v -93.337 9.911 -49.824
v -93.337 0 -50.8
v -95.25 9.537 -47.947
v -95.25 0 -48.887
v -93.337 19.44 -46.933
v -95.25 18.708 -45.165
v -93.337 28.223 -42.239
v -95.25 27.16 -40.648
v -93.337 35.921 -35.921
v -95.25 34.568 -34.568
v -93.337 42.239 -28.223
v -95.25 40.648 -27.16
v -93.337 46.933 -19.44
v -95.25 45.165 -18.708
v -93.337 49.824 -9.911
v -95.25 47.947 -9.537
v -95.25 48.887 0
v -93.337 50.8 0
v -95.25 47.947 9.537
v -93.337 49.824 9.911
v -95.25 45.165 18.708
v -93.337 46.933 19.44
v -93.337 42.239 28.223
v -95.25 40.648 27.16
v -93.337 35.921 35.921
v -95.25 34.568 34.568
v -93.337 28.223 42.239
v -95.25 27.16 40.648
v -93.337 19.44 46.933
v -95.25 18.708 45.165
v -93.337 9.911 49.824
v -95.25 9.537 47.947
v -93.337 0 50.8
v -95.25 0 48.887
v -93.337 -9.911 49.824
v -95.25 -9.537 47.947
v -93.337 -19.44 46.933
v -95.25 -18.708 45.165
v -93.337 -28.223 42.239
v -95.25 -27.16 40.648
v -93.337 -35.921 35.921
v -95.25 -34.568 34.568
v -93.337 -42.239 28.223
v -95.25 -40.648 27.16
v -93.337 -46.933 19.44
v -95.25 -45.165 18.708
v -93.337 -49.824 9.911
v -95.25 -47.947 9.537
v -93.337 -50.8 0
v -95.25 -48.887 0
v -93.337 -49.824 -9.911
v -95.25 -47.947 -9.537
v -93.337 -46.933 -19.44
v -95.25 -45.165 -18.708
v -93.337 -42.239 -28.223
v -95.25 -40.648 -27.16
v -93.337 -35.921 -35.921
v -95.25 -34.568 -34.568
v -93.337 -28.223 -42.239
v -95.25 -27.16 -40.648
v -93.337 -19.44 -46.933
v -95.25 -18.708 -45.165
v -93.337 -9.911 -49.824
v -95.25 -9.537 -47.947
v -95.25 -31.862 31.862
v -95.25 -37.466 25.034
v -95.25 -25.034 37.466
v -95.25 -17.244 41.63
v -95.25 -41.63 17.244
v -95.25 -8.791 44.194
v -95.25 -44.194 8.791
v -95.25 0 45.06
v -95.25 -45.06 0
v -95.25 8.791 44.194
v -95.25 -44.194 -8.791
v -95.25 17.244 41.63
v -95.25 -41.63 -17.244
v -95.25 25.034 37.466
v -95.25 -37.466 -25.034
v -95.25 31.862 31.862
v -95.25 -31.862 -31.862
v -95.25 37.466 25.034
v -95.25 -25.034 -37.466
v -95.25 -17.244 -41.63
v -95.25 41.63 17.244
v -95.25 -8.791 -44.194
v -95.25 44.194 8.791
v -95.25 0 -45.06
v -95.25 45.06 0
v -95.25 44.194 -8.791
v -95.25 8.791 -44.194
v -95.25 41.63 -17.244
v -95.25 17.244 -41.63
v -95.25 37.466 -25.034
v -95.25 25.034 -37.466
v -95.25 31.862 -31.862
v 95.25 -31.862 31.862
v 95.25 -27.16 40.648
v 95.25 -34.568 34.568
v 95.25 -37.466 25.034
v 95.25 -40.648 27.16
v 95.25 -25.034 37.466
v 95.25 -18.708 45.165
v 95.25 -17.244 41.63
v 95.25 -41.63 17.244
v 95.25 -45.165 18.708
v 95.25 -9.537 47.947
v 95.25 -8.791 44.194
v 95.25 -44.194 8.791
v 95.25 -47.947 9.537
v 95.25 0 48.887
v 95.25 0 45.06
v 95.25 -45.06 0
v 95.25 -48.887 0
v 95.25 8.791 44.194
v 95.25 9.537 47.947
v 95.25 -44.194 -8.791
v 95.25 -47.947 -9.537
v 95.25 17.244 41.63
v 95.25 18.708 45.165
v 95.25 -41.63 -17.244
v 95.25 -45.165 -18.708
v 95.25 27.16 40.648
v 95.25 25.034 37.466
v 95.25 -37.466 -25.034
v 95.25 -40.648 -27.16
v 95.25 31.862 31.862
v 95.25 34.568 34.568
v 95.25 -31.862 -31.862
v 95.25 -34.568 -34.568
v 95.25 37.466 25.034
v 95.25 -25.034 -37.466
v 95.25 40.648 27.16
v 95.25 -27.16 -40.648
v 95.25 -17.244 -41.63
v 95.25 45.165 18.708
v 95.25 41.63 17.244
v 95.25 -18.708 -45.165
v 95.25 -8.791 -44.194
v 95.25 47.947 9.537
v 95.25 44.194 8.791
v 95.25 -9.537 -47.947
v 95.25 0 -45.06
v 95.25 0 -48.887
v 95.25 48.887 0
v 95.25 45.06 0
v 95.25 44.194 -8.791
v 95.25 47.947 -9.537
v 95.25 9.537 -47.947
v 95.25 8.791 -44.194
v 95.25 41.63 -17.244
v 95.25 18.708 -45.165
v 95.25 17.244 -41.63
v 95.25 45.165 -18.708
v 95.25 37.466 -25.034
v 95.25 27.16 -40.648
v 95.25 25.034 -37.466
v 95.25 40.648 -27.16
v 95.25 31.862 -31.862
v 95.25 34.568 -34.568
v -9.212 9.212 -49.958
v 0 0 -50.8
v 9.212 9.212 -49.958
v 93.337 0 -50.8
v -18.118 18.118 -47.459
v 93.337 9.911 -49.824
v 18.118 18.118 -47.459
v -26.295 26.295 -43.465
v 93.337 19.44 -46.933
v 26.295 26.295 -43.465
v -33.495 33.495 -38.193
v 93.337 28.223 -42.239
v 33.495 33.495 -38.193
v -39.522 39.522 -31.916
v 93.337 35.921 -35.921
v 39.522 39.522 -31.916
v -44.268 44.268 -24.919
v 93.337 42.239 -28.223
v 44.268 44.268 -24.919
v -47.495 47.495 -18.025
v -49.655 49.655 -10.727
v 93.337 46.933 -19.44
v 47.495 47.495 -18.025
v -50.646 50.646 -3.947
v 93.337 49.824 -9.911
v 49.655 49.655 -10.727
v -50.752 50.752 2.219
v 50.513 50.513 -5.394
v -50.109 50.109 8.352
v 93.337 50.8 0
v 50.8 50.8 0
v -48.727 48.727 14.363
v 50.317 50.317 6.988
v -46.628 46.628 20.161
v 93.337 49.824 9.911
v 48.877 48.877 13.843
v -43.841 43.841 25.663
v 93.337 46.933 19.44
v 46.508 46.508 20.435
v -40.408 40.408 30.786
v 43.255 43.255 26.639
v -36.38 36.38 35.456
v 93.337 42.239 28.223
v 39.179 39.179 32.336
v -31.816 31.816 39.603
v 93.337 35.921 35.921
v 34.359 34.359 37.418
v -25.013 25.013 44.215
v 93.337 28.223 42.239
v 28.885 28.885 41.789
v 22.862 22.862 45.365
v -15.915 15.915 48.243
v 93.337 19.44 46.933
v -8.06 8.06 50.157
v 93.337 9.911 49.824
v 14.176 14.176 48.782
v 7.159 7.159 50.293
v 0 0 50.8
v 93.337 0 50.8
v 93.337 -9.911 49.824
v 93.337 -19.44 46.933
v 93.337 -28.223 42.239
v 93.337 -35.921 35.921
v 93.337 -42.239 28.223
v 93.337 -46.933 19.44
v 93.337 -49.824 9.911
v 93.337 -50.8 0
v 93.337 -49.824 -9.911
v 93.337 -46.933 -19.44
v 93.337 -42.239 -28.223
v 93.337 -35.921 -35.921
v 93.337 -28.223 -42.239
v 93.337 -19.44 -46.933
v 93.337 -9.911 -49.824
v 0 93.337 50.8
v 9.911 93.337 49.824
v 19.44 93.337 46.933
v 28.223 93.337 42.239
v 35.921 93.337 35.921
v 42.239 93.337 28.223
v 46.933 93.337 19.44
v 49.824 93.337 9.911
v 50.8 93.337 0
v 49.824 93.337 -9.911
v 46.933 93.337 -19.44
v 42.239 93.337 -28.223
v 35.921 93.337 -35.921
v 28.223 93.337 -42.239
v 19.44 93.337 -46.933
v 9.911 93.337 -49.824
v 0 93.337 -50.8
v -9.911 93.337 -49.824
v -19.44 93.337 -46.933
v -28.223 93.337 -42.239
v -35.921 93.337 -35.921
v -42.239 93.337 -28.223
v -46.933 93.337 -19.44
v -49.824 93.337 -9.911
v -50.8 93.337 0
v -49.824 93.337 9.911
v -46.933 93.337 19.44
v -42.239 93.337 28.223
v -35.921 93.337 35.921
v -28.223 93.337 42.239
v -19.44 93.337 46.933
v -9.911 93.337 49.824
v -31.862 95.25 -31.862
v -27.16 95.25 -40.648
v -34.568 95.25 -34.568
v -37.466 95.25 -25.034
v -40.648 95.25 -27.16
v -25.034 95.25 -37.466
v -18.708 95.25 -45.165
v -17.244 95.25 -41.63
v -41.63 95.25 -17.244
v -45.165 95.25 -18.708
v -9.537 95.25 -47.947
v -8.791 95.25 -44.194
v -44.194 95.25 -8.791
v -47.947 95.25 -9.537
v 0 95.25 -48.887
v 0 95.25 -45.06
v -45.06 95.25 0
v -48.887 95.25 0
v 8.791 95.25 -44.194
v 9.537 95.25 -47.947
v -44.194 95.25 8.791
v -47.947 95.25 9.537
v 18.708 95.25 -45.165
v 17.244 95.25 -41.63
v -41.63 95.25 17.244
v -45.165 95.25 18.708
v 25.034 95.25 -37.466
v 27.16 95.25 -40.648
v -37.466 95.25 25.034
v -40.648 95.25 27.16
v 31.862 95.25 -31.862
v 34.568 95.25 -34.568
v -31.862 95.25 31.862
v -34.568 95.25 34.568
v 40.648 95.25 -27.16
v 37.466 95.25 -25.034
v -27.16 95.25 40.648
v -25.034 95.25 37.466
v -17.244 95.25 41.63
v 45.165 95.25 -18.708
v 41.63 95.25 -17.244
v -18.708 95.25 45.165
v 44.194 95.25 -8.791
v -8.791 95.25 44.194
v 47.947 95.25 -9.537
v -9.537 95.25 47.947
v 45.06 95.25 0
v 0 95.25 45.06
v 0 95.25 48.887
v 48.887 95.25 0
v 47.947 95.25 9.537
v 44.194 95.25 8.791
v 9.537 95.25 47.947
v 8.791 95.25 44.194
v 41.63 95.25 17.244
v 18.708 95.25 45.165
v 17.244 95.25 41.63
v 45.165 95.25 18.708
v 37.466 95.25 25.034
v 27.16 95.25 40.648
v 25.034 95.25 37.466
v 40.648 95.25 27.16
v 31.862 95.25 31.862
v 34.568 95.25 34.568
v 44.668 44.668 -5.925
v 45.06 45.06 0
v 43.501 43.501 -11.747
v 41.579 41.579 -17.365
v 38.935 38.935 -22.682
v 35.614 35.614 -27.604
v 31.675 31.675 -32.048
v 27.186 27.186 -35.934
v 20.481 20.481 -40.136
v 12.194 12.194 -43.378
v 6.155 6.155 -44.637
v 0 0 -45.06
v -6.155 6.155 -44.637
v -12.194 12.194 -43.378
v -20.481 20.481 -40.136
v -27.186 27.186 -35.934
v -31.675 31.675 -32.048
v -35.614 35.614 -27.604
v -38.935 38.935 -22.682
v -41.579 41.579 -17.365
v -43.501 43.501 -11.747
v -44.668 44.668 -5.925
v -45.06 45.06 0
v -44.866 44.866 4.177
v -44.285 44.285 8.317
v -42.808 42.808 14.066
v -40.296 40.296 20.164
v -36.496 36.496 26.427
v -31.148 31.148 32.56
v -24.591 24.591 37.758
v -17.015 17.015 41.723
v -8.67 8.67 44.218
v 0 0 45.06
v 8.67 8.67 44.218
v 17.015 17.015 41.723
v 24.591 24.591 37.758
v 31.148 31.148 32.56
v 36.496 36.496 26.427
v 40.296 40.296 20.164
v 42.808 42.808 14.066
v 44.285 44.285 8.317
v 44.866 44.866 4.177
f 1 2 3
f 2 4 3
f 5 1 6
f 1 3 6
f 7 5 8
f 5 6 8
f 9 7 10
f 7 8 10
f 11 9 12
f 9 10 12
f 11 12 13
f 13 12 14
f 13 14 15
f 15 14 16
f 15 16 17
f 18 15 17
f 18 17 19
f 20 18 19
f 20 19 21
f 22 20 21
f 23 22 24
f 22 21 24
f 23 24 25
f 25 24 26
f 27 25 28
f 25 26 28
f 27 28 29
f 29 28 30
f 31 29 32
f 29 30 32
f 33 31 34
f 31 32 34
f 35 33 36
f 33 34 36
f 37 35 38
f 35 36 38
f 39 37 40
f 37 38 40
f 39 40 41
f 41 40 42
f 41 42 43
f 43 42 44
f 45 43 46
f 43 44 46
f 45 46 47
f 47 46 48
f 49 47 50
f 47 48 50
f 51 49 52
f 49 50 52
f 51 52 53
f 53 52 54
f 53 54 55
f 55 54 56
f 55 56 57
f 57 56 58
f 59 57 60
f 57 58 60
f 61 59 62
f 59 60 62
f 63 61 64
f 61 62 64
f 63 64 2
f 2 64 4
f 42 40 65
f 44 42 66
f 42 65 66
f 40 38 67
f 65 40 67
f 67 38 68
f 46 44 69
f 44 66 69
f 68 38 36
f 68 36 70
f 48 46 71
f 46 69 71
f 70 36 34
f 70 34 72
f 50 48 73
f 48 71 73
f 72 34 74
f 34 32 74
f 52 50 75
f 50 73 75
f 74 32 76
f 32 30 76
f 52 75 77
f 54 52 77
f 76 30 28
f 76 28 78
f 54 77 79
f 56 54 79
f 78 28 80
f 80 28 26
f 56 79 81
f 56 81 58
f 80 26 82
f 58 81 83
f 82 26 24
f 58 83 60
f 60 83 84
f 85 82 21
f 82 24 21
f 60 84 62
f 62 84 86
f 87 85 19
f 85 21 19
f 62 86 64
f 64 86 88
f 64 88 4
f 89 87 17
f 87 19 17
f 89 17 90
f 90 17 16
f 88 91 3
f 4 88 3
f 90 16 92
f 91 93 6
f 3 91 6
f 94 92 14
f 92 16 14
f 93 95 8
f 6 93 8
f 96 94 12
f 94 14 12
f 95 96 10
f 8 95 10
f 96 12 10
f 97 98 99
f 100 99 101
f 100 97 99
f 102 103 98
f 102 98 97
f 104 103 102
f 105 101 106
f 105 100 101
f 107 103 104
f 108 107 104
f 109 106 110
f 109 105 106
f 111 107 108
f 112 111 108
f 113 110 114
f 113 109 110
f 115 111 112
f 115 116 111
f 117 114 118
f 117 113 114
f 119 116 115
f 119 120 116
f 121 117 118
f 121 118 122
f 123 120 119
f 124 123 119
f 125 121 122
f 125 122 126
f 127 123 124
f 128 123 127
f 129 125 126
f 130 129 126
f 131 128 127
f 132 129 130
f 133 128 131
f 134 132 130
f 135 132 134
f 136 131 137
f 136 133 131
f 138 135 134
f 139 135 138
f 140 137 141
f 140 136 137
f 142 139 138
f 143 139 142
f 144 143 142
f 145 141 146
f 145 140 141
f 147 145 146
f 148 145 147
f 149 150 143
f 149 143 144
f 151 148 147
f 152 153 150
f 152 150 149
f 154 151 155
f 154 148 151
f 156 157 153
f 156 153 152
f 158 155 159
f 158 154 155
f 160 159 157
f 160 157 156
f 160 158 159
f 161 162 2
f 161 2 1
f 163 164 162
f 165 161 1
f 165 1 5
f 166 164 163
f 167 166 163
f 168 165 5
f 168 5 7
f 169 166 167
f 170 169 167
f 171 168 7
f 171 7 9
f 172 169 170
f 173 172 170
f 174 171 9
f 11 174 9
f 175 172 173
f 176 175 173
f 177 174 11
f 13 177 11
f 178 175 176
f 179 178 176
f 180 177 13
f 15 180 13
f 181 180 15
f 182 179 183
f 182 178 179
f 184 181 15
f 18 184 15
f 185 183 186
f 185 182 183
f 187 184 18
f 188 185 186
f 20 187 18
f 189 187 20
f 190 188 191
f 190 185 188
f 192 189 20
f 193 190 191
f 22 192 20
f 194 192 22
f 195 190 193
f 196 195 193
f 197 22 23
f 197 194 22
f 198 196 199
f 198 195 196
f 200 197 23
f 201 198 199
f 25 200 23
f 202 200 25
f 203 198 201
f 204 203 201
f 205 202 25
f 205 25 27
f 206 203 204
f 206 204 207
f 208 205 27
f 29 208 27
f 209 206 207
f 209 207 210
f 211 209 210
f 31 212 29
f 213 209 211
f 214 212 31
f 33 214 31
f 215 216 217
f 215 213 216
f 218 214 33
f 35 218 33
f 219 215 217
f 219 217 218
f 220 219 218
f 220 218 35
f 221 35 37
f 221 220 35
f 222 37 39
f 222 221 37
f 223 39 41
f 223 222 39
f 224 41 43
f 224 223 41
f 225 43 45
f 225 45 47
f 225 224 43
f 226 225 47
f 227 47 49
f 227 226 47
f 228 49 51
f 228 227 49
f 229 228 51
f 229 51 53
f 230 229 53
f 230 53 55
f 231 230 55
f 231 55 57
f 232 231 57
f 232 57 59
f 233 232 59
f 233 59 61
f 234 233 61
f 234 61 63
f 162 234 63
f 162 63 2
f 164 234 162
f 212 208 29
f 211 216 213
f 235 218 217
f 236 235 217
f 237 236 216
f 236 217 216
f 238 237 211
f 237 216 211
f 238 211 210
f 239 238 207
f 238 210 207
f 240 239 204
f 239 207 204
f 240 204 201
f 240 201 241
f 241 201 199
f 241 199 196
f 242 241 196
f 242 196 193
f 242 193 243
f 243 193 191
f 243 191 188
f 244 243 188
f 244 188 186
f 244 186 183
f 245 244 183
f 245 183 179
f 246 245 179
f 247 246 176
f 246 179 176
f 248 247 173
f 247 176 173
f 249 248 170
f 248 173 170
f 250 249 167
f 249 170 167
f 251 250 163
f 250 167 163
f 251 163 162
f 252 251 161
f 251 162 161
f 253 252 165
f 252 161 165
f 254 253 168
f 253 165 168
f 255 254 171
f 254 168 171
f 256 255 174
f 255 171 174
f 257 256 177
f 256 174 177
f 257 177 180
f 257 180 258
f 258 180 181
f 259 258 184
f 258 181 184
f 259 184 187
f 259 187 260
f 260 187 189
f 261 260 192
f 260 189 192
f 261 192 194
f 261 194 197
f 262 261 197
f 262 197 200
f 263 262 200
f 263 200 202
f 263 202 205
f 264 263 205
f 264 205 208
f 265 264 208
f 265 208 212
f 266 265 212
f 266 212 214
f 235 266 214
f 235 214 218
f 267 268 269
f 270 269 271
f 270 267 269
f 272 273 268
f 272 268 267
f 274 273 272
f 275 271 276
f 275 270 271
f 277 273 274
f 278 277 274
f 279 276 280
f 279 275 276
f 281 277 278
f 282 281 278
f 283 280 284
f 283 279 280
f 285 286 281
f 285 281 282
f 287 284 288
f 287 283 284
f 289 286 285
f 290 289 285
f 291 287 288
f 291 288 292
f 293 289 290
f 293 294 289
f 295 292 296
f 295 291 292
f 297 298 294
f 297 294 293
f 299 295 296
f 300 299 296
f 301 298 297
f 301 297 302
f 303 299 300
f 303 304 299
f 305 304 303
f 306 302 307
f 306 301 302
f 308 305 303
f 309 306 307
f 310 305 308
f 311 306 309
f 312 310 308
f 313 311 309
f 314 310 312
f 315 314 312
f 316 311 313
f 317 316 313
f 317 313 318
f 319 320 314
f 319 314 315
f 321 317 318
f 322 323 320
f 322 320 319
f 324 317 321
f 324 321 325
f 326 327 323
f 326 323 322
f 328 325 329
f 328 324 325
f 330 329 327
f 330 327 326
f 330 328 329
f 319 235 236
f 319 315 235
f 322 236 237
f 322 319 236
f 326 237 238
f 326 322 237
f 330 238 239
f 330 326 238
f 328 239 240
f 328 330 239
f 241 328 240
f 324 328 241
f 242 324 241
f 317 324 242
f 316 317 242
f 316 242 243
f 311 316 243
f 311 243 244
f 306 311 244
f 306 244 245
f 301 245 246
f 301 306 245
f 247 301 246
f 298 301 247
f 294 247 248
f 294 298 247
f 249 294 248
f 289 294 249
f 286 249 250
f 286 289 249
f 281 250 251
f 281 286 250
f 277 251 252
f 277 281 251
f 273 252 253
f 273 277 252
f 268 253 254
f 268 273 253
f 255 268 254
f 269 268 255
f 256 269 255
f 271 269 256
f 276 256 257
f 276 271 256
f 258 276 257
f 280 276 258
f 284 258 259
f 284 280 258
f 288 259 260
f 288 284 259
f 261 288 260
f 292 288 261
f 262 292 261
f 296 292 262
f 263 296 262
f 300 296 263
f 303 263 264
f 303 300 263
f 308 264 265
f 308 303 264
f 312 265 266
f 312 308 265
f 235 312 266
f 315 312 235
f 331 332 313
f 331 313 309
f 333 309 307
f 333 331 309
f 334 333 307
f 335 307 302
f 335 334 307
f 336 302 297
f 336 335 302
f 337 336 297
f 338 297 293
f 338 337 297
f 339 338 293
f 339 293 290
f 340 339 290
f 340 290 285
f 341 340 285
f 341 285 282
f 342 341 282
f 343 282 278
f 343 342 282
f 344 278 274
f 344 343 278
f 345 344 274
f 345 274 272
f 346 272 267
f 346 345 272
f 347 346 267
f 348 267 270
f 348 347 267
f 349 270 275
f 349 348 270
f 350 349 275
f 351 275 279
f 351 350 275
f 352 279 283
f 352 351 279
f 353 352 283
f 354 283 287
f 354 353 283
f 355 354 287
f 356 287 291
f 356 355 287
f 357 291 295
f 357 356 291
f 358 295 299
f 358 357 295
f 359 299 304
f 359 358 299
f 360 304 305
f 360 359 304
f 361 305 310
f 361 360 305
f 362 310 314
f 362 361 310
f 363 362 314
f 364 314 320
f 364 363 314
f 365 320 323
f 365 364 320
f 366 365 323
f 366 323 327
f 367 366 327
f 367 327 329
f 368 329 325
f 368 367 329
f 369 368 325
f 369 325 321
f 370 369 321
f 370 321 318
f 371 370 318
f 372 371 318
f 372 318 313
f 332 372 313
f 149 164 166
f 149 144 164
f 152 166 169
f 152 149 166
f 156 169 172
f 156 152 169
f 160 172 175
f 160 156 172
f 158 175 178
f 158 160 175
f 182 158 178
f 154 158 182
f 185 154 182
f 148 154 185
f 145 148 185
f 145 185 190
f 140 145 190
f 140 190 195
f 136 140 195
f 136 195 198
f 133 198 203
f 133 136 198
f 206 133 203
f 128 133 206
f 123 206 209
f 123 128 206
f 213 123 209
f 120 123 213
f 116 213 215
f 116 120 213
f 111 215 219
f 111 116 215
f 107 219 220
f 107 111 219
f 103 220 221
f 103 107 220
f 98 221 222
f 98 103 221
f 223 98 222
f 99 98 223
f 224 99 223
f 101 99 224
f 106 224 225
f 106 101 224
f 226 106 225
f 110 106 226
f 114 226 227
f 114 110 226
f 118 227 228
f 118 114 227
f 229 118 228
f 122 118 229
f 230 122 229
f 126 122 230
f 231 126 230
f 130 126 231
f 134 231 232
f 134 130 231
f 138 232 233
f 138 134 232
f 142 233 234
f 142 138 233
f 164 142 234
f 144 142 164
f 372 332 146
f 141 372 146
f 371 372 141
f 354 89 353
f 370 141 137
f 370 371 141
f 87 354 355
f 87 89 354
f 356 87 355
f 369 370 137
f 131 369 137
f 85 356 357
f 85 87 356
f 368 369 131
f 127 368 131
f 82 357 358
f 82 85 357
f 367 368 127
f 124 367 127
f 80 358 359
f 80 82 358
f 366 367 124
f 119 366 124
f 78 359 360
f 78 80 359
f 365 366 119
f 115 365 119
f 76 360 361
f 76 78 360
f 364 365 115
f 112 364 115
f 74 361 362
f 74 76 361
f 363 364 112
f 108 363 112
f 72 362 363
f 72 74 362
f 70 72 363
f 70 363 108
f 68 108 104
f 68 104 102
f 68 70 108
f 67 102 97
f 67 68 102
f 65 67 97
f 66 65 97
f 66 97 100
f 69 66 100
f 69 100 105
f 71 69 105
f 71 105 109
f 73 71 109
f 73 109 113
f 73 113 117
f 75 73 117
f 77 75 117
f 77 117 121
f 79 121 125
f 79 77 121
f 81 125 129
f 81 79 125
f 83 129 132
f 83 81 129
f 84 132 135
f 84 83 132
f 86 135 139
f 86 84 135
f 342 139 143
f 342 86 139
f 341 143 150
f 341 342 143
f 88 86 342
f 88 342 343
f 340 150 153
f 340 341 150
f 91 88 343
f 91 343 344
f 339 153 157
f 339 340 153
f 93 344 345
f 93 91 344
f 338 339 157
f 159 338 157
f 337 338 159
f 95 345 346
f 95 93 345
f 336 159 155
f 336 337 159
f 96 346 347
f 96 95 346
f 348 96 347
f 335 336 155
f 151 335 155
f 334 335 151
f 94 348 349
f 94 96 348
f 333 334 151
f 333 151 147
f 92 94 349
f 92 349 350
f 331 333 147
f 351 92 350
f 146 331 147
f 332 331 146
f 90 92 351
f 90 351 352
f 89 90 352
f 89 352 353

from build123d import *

# Parameters (mm, degrees)
RUNROUTE_R           = 50.8
RUNEXTRUDE_DEPTH     = 95.25
OUTLETROUTE_R        = 50.8
OUTLETEXTRUDE_DEPTH  = 95.25
TEESHELL_START       = -95.25
TEESHELL_OUTLINE_R   = 45.0596
TEESHELL_DEPTH       = 190.5
TEESHELL_START_2     = -1e-07
TEESHELL_2_OUTLINE_R = 45.0596
TEESHELL_2_DEPTH     = 95.2500001
TEECHAMFER_SIZE      = 1.913466667


with BuildPart() as part:
    # RunRoute → RunExtrude (new body)
    with BuildSketch(Plane(origin=(0, 0, 0), x_dir=(0, 0, -1), z_dir=(1, 0, 0))):
        Circle(RUNROUTE_R)
    runextrude = extrude(amount=RUNEXTRUDE_DEPTH)

    # RunExtrudeMirror: RunExtrude across plane
    add(runextrude.mirror(Plane(origin=(0, 0, 0), x_dir=(0, 0, 1), z_dir=(1, 0, 0))))

    # OutletRoute → OutletExtrude (add)
    with BuildSketch(Plane(origin=(0, 0, 0), x_dir=(1, 0, 0), z_dir=(0, 1, 0))):
        with Locations(Location((0, 0, 0), (0, 0, 270))):
            Circle(OUTLETROUTE_R)
    extrude(amount=OUTLETEXTRUDE_DEPTH)

    # TeeShell: read off the stored shape, not the designer's step
    # TeeShell outline → TeeShell (cut)
    with BuildSketch(Plane.YZ.offset(TEESHELL_START)):
        Circle(TEESHELL_OUTLINE_R)
    extrude(amount=TEESHELL_DEPTH, mode=Mode.SUBTRACT)

    # TeeShell 2 outline → TeeShell 2 (cut)
    with BuildSketch(Plane(origin=(0, 0, 0), x_dir=(1, 0, 0), z_dir=(0, 1, 0)).offset(TEESHELL_START_2)):
        Circle(TEESHELL_2_OUTLINE_R)
    extrude(amount=TEESHELL_2_DEPTH, mode=Mode.SUBTRACT)

    # TeeChamfer
    # the kernel refuses this chamfer: 1.913466667 mm, written as the material it takes off along each edge
    with BuildSketch(Plane(origin=(95.25, 0, 0), x_dir=(0, 0, -1), z_dir=(0, -1, 0))) as teechamfer_piece_1:
        Polygon((50.8, -TEECHAMFER_SIZE), (50.8 - TEECHAMFER_SIZE, 0), (50.8, 0), align=None)
    revolve(axis=Axis((95.25, 0, 0), (1, 0, 0)), mode=Mode.SUBTRACT)
    with BuildSketch(Plane(origin=(-95.25, 0, 0), x_dir=(0, 0, -1), z_dir=(0, -1, 0))) as teechamfer_piece_2:
        Polygon((50.8, TEECHAMFER_SIZE), (50.8 - TEECHAMFER_SIZE, 0), (50.8, 0), align=None)
    revolve(axis=Axis((-95.25, 0, 0), (1, 0, 0)), mode=Mode.SUBTRACT)
    with BuildSketch(Plane(origin=(0, 95.25, 0), x_dir=(0, 0, 1), z_dir=(-1, 0, 0))) as teechamfer_piece_3:
        Polygon((50.8, -TEECHAMFER_SIZE), (50.8 - TEECHAMFER_SIZE, 0), (50.8, 0), align=None)
    revolve(axis=Axis((0, 95.25, 0), (0, 1, 0)), mode=Mode.SUBTRACT)


solid = part.part
